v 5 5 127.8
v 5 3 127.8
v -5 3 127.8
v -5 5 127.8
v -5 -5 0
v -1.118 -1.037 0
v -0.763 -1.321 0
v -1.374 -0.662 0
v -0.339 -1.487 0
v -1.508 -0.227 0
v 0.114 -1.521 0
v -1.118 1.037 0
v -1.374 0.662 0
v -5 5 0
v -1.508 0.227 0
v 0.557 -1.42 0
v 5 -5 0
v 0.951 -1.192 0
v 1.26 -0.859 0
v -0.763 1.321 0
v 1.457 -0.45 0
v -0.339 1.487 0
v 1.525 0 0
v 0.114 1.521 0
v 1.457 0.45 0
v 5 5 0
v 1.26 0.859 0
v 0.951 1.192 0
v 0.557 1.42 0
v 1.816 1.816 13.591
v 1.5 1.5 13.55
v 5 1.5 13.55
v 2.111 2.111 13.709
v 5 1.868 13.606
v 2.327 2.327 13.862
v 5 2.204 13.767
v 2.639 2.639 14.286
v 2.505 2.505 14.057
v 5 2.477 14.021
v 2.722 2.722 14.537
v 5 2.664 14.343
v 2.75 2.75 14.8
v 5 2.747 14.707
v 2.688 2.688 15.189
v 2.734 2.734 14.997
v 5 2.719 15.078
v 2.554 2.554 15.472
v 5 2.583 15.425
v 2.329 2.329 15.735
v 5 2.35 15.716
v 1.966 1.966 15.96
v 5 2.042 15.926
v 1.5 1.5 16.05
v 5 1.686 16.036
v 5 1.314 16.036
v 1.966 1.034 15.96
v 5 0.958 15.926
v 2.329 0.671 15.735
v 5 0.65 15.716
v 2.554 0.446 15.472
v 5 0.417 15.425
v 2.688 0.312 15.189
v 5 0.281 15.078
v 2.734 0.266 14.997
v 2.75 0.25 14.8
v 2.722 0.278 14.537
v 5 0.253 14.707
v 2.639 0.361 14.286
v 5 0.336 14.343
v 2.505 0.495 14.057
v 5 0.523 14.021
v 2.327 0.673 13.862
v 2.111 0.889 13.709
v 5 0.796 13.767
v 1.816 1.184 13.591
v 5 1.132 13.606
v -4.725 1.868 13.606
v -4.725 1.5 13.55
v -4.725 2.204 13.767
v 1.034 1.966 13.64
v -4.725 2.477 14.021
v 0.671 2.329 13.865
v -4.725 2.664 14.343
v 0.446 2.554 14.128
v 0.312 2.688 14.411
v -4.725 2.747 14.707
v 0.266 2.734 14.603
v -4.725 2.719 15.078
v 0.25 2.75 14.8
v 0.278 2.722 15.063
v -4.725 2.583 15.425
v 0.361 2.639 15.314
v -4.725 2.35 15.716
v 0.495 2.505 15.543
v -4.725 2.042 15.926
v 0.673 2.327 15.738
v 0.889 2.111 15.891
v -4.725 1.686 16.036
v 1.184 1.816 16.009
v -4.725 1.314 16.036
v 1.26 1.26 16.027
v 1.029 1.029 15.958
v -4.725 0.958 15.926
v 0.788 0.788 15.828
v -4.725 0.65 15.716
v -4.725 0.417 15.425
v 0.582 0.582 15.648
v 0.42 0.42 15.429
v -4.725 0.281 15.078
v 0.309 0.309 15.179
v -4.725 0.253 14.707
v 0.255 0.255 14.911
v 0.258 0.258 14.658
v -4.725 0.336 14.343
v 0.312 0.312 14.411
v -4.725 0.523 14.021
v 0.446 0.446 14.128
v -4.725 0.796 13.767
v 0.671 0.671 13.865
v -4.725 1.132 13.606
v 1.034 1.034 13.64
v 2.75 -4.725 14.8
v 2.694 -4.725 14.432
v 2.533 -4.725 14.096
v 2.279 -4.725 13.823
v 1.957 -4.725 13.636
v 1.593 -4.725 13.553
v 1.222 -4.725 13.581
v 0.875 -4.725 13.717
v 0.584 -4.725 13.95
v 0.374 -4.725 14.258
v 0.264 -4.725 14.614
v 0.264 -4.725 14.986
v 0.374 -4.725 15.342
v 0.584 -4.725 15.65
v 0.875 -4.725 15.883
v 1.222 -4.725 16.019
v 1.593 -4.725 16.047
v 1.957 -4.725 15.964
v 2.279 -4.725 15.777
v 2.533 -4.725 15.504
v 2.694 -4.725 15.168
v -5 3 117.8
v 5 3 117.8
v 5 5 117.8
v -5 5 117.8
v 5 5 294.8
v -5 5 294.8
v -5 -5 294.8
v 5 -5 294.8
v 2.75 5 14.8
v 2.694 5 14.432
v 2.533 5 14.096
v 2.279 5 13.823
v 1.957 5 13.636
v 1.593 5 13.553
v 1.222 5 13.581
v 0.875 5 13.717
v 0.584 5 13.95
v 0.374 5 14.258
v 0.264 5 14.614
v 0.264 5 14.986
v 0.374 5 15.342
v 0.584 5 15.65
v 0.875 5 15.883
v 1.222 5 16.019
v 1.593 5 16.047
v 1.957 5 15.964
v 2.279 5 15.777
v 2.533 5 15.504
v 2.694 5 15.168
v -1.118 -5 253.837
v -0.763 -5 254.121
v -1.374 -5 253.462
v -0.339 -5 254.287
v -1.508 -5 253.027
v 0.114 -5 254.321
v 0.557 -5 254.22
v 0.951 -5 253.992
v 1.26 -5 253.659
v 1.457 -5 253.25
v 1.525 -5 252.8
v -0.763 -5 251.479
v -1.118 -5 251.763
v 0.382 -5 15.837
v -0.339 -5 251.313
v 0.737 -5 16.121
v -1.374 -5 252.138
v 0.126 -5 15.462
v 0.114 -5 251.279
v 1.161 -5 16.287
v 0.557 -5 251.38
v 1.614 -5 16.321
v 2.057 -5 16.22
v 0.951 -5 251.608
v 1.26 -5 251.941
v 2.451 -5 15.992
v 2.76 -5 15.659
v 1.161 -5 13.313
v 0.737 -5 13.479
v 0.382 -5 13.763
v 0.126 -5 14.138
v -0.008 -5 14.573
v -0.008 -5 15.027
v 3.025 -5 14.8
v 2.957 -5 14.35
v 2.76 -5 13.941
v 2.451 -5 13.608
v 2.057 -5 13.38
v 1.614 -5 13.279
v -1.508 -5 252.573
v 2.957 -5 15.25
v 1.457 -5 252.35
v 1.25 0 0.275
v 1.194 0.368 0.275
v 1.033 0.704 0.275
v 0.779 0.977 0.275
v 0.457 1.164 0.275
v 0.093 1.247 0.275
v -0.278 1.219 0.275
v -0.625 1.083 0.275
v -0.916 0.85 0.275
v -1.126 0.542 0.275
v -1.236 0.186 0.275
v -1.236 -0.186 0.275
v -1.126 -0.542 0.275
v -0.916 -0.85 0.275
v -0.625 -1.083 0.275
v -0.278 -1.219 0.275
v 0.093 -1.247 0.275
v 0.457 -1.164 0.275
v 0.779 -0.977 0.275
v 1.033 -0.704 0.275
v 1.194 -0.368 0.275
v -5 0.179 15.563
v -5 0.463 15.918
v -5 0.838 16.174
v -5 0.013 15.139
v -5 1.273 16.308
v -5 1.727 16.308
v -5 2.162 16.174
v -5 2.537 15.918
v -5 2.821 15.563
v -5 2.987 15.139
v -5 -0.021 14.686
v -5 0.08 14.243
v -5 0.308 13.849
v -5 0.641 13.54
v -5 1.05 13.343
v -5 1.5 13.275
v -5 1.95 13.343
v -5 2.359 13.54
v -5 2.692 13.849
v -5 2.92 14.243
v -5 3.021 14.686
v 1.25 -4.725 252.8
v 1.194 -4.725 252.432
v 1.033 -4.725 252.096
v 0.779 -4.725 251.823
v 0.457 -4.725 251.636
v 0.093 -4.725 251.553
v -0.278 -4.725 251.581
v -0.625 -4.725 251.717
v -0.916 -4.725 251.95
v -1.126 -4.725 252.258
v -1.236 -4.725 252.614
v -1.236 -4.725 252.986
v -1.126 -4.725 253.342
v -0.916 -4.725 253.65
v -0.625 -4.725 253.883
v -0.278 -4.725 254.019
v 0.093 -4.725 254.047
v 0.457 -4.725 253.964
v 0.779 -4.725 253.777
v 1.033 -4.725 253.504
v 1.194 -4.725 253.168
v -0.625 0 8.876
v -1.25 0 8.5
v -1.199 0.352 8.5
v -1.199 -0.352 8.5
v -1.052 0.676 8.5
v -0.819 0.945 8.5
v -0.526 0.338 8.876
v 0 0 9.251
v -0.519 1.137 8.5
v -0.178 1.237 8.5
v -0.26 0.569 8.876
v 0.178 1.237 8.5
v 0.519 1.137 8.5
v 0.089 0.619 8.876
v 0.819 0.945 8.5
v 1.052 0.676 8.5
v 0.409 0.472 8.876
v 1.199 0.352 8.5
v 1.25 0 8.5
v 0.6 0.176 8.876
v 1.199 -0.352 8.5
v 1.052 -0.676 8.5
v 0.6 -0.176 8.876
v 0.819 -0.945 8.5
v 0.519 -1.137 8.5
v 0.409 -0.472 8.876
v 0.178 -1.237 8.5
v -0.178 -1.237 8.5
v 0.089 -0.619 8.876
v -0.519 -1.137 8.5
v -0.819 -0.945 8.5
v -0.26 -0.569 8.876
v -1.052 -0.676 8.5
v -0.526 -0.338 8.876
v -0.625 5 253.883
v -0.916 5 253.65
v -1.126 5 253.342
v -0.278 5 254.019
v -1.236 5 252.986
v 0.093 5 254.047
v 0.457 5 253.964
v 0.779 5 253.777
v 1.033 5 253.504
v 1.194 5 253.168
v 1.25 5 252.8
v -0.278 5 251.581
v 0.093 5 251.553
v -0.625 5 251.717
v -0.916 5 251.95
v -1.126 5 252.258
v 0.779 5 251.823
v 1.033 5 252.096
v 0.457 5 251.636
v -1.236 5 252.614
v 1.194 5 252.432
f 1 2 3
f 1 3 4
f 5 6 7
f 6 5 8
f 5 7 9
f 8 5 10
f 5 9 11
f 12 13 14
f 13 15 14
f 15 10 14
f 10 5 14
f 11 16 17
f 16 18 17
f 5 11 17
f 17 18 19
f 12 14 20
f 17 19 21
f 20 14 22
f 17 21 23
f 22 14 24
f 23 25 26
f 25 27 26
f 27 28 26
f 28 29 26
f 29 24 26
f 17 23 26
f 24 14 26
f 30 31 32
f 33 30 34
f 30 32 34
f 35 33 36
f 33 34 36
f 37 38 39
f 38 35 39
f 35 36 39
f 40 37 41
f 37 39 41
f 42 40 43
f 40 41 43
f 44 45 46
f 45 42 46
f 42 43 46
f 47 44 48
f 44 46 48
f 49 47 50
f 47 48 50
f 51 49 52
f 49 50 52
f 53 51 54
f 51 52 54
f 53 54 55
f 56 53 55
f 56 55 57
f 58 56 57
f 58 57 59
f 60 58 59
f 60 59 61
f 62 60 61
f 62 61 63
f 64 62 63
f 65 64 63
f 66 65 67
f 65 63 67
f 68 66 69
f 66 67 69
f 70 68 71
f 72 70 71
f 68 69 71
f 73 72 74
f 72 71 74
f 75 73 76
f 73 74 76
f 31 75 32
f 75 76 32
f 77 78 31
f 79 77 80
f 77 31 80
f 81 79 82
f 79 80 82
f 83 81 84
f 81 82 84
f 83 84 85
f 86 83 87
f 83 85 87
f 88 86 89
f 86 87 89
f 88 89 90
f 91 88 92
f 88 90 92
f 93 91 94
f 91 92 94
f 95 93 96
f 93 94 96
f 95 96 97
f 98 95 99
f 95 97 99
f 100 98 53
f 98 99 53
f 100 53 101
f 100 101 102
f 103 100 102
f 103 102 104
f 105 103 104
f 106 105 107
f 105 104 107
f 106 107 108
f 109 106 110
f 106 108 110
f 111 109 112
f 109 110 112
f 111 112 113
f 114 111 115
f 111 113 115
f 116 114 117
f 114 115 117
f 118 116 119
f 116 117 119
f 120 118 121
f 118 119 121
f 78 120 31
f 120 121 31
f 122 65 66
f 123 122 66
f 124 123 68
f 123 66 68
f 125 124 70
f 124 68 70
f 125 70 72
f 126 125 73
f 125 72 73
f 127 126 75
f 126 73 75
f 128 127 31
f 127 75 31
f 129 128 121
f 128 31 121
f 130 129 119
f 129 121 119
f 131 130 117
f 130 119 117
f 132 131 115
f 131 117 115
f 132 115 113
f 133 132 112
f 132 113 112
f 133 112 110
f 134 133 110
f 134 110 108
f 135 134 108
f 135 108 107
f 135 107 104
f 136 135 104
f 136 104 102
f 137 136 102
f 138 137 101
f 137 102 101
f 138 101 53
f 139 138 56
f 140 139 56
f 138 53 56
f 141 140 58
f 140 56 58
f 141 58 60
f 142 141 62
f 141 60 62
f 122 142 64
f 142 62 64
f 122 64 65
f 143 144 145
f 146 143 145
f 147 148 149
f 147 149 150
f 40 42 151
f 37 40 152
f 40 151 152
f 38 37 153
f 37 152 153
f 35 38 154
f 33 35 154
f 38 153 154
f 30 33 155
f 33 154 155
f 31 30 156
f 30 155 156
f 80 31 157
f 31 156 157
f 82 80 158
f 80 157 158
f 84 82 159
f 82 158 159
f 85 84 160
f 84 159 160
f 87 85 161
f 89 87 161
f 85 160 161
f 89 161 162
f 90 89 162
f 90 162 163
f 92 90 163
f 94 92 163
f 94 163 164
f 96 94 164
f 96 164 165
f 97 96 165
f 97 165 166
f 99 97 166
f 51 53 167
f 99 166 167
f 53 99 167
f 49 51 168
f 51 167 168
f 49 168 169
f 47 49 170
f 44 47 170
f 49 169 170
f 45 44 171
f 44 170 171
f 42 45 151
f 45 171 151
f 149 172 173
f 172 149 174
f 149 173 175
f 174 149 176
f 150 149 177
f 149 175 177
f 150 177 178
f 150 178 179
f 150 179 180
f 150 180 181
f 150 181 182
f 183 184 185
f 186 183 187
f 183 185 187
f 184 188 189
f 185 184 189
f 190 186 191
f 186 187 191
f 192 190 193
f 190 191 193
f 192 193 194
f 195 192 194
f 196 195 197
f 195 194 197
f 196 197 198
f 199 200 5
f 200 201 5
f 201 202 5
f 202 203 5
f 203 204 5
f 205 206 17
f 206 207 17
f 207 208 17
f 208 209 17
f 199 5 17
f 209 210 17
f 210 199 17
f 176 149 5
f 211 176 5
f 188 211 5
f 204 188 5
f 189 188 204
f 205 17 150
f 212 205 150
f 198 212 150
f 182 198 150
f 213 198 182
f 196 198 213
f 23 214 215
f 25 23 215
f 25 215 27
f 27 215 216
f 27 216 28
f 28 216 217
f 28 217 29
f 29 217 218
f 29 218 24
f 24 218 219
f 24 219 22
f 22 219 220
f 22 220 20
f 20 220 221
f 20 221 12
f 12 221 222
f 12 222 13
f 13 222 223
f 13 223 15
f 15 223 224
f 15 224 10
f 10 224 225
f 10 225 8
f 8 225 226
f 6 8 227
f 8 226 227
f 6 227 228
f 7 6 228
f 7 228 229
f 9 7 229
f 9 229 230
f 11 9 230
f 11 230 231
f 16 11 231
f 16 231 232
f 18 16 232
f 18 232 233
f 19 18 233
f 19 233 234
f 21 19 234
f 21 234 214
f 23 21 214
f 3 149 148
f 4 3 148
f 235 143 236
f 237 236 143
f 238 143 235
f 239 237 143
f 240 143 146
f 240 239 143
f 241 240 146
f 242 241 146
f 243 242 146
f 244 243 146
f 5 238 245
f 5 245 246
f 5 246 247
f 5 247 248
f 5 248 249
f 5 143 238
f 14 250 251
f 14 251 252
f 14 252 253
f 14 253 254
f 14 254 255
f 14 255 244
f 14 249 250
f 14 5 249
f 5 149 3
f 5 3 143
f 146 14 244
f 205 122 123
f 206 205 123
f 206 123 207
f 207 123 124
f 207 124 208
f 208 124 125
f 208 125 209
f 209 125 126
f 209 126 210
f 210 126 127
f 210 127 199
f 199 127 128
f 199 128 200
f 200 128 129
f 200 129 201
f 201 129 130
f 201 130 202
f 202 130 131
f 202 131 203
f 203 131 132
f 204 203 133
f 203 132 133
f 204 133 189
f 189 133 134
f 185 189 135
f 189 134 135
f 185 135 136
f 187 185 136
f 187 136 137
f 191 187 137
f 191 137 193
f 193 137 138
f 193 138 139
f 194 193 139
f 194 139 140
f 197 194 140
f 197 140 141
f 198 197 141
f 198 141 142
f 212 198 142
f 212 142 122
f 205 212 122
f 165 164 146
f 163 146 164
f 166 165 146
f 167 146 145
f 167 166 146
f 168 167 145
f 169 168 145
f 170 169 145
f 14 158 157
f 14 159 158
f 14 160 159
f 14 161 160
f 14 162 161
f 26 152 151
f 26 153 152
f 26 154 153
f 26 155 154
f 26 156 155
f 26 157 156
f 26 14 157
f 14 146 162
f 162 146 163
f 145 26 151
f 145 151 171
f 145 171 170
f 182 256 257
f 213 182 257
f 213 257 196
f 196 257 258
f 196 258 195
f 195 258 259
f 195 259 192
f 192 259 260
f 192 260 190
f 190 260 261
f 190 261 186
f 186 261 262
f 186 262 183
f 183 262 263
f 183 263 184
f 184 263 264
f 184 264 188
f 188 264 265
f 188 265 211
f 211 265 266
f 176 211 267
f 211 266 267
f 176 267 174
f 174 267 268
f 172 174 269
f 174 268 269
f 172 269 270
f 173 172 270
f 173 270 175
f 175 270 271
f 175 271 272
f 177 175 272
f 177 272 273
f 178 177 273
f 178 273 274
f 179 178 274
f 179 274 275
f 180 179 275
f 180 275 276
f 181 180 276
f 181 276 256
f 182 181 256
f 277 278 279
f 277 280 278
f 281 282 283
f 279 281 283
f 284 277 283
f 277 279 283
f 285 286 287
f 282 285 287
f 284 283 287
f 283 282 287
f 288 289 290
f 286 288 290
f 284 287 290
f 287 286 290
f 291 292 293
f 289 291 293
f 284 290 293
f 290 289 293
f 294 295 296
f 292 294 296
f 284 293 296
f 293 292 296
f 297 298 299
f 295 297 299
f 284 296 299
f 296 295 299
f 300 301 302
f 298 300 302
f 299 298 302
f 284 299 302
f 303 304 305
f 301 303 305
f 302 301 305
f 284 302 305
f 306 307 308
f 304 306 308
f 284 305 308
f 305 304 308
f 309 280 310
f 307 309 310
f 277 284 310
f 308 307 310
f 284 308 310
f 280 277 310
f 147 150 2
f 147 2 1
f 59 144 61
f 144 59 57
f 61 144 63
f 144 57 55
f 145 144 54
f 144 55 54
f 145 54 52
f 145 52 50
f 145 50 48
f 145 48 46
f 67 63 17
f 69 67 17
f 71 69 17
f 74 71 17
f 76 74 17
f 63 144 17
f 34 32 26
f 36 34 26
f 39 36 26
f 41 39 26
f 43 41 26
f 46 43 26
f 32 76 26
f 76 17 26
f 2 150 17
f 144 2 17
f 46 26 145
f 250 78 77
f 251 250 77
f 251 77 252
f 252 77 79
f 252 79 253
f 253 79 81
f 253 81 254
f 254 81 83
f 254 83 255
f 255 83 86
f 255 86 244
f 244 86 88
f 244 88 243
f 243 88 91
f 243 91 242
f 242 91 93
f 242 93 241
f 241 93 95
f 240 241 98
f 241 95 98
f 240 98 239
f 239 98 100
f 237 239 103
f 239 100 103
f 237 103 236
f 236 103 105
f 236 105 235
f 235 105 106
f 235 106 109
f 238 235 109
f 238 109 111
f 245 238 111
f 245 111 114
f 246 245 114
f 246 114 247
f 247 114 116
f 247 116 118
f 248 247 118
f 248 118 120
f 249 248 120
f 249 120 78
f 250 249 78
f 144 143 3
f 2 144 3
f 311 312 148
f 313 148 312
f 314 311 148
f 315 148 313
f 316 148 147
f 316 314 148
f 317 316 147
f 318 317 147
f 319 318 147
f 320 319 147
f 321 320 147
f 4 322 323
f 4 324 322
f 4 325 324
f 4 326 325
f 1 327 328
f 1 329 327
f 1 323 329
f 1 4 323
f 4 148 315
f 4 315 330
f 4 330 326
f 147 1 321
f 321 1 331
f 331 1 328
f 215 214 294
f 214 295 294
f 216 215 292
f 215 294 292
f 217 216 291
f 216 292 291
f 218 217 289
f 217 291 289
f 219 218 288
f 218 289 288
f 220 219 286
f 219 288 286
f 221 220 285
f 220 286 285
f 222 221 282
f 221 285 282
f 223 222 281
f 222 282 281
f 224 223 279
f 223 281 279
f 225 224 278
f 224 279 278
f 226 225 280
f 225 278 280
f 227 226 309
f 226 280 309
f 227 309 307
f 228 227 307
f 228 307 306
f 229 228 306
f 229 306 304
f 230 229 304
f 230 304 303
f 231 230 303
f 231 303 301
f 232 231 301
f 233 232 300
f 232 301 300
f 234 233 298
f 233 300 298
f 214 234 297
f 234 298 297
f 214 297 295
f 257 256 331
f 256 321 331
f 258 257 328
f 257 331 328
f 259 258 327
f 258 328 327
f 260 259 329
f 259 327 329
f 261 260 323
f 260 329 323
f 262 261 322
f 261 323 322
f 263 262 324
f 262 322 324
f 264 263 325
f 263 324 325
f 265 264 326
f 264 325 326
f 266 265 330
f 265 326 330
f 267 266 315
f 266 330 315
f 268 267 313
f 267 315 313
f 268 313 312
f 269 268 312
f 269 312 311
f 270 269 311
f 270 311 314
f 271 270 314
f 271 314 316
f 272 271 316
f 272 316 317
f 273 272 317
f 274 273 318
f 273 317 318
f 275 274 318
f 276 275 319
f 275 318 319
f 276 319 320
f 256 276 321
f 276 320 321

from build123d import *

# Parameters (mm, degrees)
ESQUISSE1_W                     = 10
ESQUISSE1_H                     = 10
BOSS_EXTRU_1_DEPTH              = 294.8
TROU_TARAUD_M3X0_51_D           = 2.5
TROU_TARAUD_M3X0_51_DEPTH       = 8.5
TROU_TARAUD_M3X0_51_CSINK_D     = 3.05
TROU_TARAUD_M3X0_51_CSINK_ANGLE = 90
TROU_TARAUD_M3X0_51_TIP         = 0.751075774
ESQUISSE4_W                     = 10
ESQUISSE4_H                     = 2
ENL_V_MAT_EXTRU_1_DEPTH         = 11
TROU_TARAUD_M3X0_52_D           = 2.5
TROU_TARAUD_M3X0_52_CSINK_D     = 3.05
TROU_TARAUD_M3X0_52_CSINK_ANGLE = 90
TROU_TARAUD_M3X0_53_D           = 2.5
TROU_TARAUD_M3X0_53_CSINK_D     = 3.05
TROU_TARAUD_M3X0_53_CSINK_ANGLE = 90
TROU_TARAUD_M3X0_54_D           = 2.5
TROU_TARAUD_M3X0_54_CSINK_D     = 3.05
TROU_TARAUD_M3X0_54_CSINK_ANGLE = 90


with BuildPart() as part:
    # Esquisse1 → Boss.-Extru.1 (new body)
    with BuildSketch(Plane.XY):
        Rectangle(ESQUISSE1_W, ESQUISSE1_H)
    extrude(amount=BOSS_EXTRU_1_DEPTH)

    # Trou taraudé M3x0.51
    with Locations(Plane(origin=(0, 0, 0), x_dir=(-1, 0, 0), z_dir=(0, 0, -1))):
        with Locations((0, 0)):
            CounterSinkHole(TROU_TARAUD_M3X0_51_D / 2, TROU_TARAUD_M3X0_51_CSINK_D / 2, depth=TROU_TARAUD_M3X0_51_DEPTH, counter_sink_angle=TROU_TARAUD_M3X0_51_CSINK_ANGLE)
            with Locations((0, 0, -(TROU_TARAUD_M3X0_51_DEPTH + TROU_TARAUD_M3X0_51_TIP / 2))):  # 118° drill point
                Cone(0, TROU_TARAUD_M3X0_51_D / 2, TROU_TARAUD_M3X0_51_TIP, mode=Mode.SUBTRACT)

    # Esquisse4 → Enlèv. mat.-Extru.1 (cut, through all)
    with BuildSketch(Plane.ZY.offset(5)):
        with Locations((122.8, 4)):
            Rectangle(ESQUISSE4_W, ESQUISSE4_H)
    extrude(amount=-ENL_V_MAT_EXTRU_1_DEPTH, mode=Mode.SUBTRACT)

    # Trou taraudé M3x0.52 (through all)
    with Locations(Plane(origin=(0, -5, 0), x_dir=(-1, 0, 0), z_dir=(0, -1, 0))):
        with Locations((-1.5, -14.8)):
            CounterSinkHole(TROU_TARAUD_M3X0_52_D / 2, TROU_TARAUD_M3X0_52_CSINK_D / 2, counter_sink_angle=TROU_TARAUD_M3X0_52_CSINK_ANGLE)

    # Trou taraudé M3x0.53 (through all)
    with Locations(Plane.ZY.offset(5)):
        with Locations((14.8, 1.5)):
            CounterSinkHole(TROU_TARAUD_M3X0_53_D / 2, TROU_TARAUD_M3X0_53_CSINK_D / 2, counter_sink_angle=TROU_TARAUD_M3X0_53_CSINK_ANGLE)

    # Trou taraudé M3x0.54 (through all)
    with Locations(Plane(origin=(0, -5, 0), x_dir=(-1, 0, 0), z_dir=(0, -1, 0))):
        with Locations((0, -252.8)):
            CounterSinkHole(TROU_TARAUD_M3X0_54_D / 2, TROU_TARAUD_M3X0_54_CSINK_D / 2, counter_sink_angle=TROU_TARAUD_M3X0_54_CSINK_ANGLE)


solid = part.part
